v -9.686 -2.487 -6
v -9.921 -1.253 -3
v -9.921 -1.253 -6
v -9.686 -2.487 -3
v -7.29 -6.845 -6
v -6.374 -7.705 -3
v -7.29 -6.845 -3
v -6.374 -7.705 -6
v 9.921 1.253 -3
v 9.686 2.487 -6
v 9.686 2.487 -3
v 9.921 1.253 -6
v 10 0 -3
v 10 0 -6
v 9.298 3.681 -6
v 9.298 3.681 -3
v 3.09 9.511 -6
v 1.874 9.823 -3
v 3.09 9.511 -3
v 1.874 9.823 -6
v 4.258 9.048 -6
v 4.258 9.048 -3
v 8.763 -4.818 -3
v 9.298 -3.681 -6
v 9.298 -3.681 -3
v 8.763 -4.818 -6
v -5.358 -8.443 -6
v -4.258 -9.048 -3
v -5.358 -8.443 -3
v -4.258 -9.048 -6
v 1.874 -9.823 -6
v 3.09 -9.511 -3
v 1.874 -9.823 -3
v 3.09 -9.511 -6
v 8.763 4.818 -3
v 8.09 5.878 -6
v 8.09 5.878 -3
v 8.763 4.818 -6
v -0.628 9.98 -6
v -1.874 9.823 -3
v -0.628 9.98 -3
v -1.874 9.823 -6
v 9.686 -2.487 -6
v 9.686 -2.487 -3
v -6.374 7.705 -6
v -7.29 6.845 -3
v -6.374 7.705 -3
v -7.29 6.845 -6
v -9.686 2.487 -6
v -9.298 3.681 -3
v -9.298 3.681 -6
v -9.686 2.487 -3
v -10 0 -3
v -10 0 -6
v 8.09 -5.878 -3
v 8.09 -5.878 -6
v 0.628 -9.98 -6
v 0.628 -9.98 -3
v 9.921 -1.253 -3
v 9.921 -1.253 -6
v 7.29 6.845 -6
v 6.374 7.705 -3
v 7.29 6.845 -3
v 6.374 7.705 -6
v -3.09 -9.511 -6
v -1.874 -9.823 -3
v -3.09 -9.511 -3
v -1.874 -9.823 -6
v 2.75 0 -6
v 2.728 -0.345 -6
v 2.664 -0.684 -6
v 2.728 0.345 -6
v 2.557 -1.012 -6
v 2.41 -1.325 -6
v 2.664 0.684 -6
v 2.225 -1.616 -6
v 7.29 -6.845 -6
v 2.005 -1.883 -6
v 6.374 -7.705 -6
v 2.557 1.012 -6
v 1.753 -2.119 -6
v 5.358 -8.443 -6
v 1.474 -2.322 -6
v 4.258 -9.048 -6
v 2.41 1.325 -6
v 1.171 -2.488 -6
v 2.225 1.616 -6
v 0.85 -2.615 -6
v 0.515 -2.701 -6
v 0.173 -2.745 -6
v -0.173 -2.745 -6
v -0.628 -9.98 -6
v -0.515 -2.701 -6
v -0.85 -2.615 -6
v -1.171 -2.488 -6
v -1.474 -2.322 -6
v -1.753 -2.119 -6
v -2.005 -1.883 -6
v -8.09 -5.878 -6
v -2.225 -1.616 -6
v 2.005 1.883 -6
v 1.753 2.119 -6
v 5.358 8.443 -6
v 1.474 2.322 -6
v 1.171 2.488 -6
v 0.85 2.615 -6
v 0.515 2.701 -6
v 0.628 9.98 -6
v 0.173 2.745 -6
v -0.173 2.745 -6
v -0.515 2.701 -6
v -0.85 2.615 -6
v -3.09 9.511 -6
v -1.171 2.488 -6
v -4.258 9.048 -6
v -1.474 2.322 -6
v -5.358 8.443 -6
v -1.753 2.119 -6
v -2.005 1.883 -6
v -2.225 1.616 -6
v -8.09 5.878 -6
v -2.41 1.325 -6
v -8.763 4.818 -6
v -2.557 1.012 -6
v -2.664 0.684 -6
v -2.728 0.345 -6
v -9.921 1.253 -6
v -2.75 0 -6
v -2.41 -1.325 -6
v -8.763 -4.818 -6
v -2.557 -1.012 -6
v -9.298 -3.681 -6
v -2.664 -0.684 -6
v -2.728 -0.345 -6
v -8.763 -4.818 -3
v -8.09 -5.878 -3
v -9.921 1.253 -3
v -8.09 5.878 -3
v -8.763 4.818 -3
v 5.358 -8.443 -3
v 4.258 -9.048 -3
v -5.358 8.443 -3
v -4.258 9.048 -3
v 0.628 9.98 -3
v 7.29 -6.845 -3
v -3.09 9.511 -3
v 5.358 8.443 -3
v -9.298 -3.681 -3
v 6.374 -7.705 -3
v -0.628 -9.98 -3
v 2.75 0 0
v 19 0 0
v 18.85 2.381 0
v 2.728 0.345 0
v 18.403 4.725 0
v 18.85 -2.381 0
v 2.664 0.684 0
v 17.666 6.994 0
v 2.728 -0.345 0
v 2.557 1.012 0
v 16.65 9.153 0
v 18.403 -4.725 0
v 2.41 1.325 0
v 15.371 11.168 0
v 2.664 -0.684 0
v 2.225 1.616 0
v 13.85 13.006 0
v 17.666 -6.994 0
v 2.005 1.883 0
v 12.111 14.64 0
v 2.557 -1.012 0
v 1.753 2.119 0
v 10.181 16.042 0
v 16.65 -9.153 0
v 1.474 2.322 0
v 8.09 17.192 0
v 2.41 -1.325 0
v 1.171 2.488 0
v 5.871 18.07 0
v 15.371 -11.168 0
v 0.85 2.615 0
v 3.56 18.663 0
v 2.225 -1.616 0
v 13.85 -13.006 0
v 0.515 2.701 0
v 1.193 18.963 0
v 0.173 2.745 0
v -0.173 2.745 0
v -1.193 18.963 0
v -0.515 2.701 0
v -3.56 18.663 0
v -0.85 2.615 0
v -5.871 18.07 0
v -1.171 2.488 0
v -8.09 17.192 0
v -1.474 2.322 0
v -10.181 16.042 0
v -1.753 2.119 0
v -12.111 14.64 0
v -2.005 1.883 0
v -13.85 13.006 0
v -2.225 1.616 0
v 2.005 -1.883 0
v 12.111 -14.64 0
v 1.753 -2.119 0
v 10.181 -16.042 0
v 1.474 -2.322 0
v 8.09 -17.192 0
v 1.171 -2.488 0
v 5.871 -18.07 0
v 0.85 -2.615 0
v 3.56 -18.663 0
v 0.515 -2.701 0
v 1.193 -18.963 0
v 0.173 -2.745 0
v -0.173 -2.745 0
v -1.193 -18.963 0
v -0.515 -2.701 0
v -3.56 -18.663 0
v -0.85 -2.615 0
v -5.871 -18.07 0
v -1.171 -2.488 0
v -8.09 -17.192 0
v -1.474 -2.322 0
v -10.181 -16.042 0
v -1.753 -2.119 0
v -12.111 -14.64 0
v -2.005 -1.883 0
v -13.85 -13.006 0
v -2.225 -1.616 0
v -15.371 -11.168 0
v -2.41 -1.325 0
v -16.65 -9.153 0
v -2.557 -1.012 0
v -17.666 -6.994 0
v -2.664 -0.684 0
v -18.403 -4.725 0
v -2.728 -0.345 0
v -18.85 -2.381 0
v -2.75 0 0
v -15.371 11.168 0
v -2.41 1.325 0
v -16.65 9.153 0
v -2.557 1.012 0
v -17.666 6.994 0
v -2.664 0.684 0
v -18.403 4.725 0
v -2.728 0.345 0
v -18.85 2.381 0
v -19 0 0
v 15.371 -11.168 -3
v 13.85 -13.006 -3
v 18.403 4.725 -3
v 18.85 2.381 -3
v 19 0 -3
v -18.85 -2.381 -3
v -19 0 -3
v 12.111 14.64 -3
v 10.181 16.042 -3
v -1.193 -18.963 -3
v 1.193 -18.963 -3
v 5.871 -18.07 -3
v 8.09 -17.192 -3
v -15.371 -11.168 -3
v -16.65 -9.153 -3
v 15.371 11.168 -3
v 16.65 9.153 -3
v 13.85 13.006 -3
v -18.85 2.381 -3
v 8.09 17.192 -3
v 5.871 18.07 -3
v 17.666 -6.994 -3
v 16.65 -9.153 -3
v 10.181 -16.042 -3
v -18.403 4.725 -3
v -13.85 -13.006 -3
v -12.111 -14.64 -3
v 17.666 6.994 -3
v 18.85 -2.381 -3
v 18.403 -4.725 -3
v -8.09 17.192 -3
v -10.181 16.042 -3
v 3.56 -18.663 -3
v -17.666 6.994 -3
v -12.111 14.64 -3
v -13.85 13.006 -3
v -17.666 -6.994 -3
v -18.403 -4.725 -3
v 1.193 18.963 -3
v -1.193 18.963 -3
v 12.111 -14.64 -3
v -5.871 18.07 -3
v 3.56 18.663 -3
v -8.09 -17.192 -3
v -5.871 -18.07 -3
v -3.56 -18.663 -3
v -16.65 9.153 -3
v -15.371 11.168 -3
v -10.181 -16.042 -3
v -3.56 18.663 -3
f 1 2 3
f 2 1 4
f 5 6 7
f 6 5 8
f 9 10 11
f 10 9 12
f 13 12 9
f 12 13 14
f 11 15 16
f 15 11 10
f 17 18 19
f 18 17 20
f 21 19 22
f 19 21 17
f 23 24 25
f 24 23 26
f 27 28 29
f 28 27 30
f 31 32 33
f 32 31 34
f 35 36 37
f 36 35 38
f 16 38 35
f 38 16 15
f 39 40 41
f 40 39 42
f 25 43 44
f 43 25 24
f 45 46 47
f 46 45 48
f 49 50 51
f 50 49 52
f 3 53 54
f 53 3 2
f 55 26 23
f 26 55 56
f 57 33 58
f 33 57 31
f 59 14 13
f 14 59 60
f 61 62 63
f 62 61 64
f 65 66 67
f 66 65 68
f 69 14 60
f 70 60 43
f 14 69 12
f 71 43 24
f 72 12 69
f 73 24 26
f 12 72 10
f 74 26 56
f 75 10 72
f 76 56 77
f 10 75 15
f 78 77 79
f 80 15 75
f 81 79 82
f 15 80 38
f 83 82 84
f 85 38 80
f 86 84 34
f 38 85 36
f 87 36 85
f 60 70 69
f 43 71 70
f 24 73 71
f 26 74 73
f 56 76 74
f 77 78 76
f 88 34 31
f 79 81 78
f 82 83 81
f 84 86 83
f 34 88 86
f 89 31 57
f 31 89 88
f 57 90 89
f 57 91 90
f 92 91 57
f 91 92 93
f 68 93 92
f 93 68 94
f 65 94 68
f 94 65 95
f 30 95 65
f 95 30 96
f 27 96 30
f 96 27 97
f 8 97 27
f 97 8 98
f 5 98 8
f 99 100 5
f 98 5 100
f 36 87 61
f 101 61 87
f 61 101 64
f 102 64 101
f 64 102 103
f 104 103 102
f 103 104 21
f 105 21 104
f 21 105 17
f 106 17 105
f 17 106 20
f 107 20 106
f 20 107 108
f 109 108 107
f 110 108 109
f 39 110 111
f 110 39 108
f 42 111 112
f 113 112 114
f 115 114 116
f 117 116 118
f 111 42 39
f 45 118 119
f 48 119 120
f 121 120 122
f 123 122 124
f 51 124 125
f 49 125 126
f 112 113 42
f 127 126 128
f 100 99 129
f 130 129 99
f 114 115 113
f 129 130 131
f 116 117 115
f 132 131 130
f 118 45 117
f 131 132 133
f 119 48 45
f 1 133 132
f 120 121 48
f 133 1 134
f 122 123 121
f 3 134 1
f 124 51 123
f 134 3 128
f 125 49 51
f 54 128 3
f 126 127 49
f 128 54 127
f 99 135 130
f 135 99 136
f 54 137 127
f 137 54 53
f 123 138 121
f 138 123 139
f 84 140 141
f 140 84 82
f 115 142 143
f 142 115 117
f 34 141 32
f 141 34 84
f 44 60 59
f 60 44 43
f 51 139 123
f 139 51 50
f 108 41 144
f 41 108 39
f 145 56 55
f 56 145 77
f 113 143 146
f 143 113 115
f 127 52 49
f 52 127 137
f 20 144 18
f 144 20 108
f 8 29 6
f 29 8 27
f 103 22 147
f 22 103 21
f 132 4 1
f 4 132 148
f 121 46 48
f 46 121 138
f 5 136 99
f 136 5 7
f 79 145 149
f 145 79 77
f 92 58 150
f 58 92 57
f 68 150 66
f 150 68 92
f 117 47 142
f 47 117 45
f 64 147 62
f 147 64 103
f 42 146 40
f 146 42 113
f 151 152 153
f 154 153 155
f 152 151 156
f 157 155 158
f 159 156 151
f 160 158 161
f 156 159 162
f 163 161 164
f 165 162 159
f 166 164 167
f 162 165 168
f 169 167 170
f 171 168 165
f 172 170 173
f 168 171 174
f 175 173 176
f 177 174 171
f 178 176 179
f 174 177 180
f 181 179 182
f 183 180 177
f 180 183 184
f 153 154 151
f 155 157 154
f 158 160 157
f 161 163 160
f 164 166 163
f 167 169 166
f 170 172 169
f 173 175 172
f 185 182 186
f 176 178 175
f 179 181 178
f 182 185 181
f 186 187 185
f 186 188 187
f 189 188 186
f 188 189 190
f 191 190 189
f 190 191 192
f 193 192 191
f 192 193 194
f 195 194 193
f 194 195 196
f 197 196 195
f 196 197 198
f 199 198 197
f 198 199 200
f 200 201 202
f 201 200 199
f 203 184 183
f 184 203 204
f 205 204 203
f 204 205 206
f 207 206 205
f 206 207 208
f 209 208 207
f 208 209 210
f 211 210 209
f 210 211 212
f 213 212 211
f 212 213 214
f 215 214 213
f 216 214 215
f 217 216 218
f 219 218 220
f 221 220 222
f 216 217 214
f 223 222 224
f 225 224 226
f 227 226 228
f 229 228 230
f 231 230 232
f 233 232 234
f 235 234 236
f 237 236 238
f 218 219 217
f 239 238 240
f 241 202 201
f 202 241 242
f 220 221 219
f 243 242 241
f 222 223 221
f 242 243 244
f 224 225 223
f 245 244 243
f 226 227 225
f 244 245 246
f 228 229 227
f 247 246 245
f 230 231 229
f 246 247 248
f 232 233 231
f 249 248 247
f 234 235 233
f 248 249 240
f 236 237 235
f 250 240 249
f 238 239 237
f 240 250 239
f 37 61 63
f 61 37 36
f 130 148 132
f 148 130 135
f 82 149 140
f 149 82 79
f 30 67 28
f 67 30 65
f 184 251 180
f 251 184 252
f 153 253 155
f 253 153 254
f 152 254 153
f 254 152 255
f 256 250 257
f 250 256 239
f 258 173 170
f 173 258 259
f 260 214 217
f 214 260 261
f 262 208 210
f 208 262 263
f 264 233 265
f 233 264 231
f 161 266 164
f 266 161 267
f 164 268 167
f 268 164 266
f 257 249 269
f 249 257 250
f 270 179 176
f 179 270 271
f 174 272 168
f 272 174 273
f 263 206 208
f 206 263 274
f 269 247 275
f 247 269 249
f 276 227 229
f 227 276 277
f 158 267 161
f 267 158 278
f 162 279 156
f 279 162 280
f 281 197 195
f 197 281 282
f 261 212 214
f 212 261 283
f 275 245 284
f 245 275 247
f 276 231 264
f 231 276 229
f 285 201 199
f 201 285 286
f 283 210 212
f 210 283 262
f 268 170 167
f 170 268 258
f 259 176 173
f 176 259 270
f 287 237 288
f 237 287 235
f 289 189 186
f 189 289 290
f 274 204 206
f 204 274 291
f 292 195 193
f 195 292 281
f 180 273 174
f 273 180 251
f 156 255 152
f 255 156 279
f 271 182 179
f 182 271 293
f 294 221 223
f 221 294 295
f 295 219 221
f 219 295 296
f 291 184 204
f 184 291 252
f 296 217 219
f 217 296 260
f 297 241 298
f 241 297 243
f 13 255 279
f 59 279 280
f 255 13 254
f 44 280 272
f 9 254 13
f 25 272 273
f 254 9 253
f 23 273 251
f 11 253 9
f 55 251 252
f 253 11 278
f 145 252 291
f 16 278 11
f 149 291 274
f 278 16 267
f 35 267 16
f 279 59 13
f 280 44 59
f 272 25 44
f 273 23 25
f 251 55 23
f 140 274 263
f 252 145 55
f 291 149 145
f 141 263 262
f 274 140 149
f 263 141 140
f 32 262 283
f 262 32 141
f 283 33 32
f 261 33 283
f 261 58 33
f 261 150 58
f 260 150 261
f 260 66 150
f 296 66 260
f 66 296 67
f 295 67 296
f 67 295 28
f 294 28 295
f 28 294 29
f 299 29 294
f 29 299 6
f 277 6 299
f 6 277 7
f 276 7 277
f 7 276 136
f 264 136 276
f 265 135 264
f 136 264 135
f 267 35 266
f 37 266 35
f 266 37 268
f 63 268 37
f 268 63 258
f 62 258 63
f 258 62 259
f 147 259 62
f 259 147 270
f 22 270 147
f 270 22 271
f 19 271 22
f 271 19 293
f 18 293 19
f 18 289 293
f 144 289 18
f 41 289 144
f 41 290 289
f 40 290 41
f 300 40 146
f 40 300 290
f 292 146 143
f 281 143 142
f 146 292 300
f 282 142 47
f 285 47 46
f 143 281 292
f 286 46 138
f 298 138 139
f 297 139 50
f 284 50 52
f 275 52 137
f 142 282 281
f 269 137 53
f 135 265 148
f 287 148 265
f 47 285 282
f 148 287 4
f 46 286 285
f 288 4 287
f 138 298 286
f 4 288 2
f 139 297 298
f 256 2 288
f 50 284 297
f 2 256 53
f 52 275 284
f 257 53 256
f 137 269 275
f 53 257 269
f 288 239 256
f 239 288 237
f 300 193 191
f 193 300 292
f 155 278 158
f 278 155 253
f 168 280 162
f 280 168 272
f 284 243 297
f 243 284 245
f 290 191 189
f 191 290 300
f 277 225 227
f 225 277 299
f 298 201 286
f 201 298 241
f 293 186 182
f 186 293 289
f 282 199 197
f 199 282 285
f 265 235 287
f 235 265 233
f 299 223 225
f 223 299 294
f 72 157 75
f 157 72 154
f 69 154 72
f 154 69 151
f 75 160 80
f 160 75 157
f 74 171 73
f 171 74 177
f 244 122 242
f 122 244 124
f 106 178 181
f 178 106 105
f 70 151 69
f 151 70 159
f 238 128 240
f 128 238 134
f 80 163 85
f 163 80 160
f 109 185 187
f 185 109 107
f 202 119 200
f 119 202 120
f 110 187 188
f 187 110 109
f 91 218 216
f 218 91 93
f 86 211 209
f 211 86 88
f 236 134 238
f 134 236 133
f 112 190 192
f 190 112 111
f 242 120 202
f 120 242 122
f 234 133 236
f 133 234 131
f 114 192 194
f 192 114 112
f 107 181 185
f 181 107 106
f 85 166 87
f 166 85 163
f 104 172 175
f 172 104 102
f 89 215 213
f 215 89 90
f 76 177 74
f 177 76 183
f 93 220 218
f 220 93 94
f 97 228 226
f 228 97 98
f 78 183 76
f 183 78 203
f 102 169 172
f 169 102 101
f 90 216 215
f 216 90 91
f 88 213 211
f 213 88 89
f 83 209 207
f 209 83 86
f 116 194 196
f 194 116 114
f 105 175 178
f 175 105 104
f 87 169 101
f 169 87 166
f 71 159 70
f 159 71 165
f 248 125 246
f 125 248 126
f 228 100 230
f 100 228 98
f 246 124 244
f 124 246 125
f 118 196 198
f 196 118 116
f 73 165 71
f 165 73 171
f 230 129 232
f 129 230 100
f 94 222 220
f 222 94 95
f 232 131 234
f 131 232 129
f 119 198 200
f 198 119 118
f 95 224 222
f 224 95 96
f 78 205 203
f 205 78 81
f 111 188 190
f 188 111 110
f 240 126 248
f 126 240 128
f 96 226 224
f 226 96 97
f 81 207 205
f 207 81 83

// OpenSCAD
$fn = 50;


difference() {
	union() {
		translate(v = [0, 0, -6.0000000000]) {
			cylinder(h = 6, r = 10.0000000000);
		}
		translate(v = [0, 0, -3.0000000000]) {
			cylinder(h = 3, r = 19.0000000000);
		}
	}
	union() {
		#translate(v = [0, 0, -6]) {
			cylinder(h = 6, r = 2.7500000000);
		}
	}
}
